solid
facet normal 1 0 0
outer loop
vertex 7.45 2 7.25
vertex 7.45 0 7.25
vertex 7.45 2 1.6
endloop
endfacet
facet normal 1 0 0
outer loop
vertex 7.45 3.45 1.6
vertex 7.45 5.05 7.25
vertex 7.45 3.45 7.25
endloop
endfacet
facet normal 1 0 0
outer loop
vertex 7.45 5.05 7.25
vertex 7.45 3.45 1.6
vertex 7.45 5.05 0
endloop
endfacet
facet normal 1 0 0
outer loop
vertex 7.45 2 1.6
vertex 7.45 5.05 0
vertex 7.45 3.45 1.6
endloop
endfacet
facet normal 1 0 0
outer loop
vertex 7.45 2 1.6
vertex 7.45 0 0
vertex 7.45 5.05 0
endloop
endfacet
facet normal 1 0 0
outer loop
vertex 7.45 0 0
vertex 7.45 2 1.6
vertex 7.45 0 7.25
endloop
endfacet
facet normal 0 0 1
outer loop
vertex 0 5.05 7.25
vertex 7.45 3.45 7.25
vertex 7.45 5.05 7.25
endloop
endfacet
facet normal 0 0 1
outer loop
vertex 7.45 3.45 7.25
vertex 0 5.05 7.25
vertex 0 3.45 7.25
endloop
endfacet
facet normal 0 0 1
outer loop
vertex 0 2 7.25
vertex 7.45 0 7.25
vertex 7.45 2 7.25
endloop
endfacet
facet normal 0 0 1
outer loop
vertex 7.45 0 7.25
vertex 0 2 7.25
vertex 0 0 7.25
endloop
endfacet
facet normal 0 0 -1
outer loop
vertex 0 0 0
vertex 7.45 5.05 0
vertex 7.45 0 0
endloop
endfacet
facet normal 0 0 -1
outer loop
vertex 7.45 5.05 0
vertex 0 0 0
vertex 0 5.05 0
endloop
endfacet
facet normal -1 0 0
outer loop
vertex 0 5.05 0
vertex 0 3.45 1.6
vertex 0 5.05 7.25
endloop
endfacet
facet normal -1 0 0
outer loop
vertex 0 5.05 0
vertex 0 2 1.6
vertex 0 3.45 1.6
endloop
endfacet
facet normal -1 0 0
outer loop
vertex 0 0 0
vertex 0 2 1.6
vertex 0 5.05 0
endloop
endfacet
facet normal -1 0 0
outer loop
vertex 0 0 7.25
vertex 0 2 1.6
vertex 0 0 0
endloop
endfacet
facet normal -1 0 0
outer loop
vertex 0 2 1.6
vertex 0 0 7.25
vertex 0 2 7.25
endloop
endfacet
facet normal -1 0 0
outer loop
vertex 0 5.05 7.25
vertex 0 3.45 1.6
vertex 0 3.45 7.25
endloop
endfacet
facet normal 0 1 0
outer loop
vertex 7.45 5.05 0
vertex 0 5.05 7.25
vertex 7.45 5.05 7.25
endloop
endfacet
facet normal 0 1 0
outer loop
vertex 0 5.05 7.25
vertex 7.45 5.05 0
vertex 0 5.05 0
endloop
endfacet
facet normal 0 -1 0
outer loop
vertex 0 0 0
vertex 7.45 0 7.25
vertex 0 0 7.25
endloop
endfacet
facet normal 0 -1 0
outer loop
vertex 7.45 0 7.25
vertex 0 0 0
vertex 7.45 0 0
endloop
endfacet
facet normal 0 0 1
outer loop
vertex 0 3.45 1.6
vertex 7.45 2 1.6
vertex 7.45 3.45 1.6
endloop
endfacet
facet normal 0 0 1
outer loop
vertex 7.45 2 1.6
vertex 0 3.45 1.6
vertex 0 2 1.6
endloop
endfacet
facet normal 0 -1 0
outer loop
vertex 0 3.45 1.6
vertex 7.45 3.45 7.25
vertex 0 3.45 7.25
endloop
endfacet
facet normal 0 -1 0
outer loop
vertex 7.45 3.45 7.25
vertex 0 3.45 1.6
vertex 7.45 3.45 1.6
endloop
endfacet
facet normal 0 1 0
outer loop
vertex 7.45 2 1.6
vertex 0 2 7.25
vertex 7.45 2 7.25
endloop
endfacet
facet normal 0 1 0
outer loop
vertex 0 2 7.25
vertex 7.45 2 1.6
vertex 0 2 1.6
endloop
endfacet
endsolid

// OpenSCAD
mainboard_thickness = 1.45;
mainboard_angle = 35;
mainboard_width = 75.15;
mainboard_depth = 53.7;
mount_depth_left = 7.45;
mount_depth_right = 30;
groove_depth = 5.65;
clearance = 2;
platform_wall = 4;
clip_wall = 1.6;

difference() {
  cube([mount_depth_left, clearance + mainboard_thickness + clip_wall, clip_wall + groove_depth]);
  translate([0, clearance, clip_wall]) {
    cube([mount_depth_left, mainboard_thickness, groove_depth]);
  }
}

/*
difference() {
  cube([mount_depth_right, clearance + mainboard_thickness + clip_wall, clip_wall + groove_depth]);
  translate([0, clearance, clip_wall]) {
    cube([mount_depth_right, mainboard_thickness, groove_depth]);
  }
}
*/
